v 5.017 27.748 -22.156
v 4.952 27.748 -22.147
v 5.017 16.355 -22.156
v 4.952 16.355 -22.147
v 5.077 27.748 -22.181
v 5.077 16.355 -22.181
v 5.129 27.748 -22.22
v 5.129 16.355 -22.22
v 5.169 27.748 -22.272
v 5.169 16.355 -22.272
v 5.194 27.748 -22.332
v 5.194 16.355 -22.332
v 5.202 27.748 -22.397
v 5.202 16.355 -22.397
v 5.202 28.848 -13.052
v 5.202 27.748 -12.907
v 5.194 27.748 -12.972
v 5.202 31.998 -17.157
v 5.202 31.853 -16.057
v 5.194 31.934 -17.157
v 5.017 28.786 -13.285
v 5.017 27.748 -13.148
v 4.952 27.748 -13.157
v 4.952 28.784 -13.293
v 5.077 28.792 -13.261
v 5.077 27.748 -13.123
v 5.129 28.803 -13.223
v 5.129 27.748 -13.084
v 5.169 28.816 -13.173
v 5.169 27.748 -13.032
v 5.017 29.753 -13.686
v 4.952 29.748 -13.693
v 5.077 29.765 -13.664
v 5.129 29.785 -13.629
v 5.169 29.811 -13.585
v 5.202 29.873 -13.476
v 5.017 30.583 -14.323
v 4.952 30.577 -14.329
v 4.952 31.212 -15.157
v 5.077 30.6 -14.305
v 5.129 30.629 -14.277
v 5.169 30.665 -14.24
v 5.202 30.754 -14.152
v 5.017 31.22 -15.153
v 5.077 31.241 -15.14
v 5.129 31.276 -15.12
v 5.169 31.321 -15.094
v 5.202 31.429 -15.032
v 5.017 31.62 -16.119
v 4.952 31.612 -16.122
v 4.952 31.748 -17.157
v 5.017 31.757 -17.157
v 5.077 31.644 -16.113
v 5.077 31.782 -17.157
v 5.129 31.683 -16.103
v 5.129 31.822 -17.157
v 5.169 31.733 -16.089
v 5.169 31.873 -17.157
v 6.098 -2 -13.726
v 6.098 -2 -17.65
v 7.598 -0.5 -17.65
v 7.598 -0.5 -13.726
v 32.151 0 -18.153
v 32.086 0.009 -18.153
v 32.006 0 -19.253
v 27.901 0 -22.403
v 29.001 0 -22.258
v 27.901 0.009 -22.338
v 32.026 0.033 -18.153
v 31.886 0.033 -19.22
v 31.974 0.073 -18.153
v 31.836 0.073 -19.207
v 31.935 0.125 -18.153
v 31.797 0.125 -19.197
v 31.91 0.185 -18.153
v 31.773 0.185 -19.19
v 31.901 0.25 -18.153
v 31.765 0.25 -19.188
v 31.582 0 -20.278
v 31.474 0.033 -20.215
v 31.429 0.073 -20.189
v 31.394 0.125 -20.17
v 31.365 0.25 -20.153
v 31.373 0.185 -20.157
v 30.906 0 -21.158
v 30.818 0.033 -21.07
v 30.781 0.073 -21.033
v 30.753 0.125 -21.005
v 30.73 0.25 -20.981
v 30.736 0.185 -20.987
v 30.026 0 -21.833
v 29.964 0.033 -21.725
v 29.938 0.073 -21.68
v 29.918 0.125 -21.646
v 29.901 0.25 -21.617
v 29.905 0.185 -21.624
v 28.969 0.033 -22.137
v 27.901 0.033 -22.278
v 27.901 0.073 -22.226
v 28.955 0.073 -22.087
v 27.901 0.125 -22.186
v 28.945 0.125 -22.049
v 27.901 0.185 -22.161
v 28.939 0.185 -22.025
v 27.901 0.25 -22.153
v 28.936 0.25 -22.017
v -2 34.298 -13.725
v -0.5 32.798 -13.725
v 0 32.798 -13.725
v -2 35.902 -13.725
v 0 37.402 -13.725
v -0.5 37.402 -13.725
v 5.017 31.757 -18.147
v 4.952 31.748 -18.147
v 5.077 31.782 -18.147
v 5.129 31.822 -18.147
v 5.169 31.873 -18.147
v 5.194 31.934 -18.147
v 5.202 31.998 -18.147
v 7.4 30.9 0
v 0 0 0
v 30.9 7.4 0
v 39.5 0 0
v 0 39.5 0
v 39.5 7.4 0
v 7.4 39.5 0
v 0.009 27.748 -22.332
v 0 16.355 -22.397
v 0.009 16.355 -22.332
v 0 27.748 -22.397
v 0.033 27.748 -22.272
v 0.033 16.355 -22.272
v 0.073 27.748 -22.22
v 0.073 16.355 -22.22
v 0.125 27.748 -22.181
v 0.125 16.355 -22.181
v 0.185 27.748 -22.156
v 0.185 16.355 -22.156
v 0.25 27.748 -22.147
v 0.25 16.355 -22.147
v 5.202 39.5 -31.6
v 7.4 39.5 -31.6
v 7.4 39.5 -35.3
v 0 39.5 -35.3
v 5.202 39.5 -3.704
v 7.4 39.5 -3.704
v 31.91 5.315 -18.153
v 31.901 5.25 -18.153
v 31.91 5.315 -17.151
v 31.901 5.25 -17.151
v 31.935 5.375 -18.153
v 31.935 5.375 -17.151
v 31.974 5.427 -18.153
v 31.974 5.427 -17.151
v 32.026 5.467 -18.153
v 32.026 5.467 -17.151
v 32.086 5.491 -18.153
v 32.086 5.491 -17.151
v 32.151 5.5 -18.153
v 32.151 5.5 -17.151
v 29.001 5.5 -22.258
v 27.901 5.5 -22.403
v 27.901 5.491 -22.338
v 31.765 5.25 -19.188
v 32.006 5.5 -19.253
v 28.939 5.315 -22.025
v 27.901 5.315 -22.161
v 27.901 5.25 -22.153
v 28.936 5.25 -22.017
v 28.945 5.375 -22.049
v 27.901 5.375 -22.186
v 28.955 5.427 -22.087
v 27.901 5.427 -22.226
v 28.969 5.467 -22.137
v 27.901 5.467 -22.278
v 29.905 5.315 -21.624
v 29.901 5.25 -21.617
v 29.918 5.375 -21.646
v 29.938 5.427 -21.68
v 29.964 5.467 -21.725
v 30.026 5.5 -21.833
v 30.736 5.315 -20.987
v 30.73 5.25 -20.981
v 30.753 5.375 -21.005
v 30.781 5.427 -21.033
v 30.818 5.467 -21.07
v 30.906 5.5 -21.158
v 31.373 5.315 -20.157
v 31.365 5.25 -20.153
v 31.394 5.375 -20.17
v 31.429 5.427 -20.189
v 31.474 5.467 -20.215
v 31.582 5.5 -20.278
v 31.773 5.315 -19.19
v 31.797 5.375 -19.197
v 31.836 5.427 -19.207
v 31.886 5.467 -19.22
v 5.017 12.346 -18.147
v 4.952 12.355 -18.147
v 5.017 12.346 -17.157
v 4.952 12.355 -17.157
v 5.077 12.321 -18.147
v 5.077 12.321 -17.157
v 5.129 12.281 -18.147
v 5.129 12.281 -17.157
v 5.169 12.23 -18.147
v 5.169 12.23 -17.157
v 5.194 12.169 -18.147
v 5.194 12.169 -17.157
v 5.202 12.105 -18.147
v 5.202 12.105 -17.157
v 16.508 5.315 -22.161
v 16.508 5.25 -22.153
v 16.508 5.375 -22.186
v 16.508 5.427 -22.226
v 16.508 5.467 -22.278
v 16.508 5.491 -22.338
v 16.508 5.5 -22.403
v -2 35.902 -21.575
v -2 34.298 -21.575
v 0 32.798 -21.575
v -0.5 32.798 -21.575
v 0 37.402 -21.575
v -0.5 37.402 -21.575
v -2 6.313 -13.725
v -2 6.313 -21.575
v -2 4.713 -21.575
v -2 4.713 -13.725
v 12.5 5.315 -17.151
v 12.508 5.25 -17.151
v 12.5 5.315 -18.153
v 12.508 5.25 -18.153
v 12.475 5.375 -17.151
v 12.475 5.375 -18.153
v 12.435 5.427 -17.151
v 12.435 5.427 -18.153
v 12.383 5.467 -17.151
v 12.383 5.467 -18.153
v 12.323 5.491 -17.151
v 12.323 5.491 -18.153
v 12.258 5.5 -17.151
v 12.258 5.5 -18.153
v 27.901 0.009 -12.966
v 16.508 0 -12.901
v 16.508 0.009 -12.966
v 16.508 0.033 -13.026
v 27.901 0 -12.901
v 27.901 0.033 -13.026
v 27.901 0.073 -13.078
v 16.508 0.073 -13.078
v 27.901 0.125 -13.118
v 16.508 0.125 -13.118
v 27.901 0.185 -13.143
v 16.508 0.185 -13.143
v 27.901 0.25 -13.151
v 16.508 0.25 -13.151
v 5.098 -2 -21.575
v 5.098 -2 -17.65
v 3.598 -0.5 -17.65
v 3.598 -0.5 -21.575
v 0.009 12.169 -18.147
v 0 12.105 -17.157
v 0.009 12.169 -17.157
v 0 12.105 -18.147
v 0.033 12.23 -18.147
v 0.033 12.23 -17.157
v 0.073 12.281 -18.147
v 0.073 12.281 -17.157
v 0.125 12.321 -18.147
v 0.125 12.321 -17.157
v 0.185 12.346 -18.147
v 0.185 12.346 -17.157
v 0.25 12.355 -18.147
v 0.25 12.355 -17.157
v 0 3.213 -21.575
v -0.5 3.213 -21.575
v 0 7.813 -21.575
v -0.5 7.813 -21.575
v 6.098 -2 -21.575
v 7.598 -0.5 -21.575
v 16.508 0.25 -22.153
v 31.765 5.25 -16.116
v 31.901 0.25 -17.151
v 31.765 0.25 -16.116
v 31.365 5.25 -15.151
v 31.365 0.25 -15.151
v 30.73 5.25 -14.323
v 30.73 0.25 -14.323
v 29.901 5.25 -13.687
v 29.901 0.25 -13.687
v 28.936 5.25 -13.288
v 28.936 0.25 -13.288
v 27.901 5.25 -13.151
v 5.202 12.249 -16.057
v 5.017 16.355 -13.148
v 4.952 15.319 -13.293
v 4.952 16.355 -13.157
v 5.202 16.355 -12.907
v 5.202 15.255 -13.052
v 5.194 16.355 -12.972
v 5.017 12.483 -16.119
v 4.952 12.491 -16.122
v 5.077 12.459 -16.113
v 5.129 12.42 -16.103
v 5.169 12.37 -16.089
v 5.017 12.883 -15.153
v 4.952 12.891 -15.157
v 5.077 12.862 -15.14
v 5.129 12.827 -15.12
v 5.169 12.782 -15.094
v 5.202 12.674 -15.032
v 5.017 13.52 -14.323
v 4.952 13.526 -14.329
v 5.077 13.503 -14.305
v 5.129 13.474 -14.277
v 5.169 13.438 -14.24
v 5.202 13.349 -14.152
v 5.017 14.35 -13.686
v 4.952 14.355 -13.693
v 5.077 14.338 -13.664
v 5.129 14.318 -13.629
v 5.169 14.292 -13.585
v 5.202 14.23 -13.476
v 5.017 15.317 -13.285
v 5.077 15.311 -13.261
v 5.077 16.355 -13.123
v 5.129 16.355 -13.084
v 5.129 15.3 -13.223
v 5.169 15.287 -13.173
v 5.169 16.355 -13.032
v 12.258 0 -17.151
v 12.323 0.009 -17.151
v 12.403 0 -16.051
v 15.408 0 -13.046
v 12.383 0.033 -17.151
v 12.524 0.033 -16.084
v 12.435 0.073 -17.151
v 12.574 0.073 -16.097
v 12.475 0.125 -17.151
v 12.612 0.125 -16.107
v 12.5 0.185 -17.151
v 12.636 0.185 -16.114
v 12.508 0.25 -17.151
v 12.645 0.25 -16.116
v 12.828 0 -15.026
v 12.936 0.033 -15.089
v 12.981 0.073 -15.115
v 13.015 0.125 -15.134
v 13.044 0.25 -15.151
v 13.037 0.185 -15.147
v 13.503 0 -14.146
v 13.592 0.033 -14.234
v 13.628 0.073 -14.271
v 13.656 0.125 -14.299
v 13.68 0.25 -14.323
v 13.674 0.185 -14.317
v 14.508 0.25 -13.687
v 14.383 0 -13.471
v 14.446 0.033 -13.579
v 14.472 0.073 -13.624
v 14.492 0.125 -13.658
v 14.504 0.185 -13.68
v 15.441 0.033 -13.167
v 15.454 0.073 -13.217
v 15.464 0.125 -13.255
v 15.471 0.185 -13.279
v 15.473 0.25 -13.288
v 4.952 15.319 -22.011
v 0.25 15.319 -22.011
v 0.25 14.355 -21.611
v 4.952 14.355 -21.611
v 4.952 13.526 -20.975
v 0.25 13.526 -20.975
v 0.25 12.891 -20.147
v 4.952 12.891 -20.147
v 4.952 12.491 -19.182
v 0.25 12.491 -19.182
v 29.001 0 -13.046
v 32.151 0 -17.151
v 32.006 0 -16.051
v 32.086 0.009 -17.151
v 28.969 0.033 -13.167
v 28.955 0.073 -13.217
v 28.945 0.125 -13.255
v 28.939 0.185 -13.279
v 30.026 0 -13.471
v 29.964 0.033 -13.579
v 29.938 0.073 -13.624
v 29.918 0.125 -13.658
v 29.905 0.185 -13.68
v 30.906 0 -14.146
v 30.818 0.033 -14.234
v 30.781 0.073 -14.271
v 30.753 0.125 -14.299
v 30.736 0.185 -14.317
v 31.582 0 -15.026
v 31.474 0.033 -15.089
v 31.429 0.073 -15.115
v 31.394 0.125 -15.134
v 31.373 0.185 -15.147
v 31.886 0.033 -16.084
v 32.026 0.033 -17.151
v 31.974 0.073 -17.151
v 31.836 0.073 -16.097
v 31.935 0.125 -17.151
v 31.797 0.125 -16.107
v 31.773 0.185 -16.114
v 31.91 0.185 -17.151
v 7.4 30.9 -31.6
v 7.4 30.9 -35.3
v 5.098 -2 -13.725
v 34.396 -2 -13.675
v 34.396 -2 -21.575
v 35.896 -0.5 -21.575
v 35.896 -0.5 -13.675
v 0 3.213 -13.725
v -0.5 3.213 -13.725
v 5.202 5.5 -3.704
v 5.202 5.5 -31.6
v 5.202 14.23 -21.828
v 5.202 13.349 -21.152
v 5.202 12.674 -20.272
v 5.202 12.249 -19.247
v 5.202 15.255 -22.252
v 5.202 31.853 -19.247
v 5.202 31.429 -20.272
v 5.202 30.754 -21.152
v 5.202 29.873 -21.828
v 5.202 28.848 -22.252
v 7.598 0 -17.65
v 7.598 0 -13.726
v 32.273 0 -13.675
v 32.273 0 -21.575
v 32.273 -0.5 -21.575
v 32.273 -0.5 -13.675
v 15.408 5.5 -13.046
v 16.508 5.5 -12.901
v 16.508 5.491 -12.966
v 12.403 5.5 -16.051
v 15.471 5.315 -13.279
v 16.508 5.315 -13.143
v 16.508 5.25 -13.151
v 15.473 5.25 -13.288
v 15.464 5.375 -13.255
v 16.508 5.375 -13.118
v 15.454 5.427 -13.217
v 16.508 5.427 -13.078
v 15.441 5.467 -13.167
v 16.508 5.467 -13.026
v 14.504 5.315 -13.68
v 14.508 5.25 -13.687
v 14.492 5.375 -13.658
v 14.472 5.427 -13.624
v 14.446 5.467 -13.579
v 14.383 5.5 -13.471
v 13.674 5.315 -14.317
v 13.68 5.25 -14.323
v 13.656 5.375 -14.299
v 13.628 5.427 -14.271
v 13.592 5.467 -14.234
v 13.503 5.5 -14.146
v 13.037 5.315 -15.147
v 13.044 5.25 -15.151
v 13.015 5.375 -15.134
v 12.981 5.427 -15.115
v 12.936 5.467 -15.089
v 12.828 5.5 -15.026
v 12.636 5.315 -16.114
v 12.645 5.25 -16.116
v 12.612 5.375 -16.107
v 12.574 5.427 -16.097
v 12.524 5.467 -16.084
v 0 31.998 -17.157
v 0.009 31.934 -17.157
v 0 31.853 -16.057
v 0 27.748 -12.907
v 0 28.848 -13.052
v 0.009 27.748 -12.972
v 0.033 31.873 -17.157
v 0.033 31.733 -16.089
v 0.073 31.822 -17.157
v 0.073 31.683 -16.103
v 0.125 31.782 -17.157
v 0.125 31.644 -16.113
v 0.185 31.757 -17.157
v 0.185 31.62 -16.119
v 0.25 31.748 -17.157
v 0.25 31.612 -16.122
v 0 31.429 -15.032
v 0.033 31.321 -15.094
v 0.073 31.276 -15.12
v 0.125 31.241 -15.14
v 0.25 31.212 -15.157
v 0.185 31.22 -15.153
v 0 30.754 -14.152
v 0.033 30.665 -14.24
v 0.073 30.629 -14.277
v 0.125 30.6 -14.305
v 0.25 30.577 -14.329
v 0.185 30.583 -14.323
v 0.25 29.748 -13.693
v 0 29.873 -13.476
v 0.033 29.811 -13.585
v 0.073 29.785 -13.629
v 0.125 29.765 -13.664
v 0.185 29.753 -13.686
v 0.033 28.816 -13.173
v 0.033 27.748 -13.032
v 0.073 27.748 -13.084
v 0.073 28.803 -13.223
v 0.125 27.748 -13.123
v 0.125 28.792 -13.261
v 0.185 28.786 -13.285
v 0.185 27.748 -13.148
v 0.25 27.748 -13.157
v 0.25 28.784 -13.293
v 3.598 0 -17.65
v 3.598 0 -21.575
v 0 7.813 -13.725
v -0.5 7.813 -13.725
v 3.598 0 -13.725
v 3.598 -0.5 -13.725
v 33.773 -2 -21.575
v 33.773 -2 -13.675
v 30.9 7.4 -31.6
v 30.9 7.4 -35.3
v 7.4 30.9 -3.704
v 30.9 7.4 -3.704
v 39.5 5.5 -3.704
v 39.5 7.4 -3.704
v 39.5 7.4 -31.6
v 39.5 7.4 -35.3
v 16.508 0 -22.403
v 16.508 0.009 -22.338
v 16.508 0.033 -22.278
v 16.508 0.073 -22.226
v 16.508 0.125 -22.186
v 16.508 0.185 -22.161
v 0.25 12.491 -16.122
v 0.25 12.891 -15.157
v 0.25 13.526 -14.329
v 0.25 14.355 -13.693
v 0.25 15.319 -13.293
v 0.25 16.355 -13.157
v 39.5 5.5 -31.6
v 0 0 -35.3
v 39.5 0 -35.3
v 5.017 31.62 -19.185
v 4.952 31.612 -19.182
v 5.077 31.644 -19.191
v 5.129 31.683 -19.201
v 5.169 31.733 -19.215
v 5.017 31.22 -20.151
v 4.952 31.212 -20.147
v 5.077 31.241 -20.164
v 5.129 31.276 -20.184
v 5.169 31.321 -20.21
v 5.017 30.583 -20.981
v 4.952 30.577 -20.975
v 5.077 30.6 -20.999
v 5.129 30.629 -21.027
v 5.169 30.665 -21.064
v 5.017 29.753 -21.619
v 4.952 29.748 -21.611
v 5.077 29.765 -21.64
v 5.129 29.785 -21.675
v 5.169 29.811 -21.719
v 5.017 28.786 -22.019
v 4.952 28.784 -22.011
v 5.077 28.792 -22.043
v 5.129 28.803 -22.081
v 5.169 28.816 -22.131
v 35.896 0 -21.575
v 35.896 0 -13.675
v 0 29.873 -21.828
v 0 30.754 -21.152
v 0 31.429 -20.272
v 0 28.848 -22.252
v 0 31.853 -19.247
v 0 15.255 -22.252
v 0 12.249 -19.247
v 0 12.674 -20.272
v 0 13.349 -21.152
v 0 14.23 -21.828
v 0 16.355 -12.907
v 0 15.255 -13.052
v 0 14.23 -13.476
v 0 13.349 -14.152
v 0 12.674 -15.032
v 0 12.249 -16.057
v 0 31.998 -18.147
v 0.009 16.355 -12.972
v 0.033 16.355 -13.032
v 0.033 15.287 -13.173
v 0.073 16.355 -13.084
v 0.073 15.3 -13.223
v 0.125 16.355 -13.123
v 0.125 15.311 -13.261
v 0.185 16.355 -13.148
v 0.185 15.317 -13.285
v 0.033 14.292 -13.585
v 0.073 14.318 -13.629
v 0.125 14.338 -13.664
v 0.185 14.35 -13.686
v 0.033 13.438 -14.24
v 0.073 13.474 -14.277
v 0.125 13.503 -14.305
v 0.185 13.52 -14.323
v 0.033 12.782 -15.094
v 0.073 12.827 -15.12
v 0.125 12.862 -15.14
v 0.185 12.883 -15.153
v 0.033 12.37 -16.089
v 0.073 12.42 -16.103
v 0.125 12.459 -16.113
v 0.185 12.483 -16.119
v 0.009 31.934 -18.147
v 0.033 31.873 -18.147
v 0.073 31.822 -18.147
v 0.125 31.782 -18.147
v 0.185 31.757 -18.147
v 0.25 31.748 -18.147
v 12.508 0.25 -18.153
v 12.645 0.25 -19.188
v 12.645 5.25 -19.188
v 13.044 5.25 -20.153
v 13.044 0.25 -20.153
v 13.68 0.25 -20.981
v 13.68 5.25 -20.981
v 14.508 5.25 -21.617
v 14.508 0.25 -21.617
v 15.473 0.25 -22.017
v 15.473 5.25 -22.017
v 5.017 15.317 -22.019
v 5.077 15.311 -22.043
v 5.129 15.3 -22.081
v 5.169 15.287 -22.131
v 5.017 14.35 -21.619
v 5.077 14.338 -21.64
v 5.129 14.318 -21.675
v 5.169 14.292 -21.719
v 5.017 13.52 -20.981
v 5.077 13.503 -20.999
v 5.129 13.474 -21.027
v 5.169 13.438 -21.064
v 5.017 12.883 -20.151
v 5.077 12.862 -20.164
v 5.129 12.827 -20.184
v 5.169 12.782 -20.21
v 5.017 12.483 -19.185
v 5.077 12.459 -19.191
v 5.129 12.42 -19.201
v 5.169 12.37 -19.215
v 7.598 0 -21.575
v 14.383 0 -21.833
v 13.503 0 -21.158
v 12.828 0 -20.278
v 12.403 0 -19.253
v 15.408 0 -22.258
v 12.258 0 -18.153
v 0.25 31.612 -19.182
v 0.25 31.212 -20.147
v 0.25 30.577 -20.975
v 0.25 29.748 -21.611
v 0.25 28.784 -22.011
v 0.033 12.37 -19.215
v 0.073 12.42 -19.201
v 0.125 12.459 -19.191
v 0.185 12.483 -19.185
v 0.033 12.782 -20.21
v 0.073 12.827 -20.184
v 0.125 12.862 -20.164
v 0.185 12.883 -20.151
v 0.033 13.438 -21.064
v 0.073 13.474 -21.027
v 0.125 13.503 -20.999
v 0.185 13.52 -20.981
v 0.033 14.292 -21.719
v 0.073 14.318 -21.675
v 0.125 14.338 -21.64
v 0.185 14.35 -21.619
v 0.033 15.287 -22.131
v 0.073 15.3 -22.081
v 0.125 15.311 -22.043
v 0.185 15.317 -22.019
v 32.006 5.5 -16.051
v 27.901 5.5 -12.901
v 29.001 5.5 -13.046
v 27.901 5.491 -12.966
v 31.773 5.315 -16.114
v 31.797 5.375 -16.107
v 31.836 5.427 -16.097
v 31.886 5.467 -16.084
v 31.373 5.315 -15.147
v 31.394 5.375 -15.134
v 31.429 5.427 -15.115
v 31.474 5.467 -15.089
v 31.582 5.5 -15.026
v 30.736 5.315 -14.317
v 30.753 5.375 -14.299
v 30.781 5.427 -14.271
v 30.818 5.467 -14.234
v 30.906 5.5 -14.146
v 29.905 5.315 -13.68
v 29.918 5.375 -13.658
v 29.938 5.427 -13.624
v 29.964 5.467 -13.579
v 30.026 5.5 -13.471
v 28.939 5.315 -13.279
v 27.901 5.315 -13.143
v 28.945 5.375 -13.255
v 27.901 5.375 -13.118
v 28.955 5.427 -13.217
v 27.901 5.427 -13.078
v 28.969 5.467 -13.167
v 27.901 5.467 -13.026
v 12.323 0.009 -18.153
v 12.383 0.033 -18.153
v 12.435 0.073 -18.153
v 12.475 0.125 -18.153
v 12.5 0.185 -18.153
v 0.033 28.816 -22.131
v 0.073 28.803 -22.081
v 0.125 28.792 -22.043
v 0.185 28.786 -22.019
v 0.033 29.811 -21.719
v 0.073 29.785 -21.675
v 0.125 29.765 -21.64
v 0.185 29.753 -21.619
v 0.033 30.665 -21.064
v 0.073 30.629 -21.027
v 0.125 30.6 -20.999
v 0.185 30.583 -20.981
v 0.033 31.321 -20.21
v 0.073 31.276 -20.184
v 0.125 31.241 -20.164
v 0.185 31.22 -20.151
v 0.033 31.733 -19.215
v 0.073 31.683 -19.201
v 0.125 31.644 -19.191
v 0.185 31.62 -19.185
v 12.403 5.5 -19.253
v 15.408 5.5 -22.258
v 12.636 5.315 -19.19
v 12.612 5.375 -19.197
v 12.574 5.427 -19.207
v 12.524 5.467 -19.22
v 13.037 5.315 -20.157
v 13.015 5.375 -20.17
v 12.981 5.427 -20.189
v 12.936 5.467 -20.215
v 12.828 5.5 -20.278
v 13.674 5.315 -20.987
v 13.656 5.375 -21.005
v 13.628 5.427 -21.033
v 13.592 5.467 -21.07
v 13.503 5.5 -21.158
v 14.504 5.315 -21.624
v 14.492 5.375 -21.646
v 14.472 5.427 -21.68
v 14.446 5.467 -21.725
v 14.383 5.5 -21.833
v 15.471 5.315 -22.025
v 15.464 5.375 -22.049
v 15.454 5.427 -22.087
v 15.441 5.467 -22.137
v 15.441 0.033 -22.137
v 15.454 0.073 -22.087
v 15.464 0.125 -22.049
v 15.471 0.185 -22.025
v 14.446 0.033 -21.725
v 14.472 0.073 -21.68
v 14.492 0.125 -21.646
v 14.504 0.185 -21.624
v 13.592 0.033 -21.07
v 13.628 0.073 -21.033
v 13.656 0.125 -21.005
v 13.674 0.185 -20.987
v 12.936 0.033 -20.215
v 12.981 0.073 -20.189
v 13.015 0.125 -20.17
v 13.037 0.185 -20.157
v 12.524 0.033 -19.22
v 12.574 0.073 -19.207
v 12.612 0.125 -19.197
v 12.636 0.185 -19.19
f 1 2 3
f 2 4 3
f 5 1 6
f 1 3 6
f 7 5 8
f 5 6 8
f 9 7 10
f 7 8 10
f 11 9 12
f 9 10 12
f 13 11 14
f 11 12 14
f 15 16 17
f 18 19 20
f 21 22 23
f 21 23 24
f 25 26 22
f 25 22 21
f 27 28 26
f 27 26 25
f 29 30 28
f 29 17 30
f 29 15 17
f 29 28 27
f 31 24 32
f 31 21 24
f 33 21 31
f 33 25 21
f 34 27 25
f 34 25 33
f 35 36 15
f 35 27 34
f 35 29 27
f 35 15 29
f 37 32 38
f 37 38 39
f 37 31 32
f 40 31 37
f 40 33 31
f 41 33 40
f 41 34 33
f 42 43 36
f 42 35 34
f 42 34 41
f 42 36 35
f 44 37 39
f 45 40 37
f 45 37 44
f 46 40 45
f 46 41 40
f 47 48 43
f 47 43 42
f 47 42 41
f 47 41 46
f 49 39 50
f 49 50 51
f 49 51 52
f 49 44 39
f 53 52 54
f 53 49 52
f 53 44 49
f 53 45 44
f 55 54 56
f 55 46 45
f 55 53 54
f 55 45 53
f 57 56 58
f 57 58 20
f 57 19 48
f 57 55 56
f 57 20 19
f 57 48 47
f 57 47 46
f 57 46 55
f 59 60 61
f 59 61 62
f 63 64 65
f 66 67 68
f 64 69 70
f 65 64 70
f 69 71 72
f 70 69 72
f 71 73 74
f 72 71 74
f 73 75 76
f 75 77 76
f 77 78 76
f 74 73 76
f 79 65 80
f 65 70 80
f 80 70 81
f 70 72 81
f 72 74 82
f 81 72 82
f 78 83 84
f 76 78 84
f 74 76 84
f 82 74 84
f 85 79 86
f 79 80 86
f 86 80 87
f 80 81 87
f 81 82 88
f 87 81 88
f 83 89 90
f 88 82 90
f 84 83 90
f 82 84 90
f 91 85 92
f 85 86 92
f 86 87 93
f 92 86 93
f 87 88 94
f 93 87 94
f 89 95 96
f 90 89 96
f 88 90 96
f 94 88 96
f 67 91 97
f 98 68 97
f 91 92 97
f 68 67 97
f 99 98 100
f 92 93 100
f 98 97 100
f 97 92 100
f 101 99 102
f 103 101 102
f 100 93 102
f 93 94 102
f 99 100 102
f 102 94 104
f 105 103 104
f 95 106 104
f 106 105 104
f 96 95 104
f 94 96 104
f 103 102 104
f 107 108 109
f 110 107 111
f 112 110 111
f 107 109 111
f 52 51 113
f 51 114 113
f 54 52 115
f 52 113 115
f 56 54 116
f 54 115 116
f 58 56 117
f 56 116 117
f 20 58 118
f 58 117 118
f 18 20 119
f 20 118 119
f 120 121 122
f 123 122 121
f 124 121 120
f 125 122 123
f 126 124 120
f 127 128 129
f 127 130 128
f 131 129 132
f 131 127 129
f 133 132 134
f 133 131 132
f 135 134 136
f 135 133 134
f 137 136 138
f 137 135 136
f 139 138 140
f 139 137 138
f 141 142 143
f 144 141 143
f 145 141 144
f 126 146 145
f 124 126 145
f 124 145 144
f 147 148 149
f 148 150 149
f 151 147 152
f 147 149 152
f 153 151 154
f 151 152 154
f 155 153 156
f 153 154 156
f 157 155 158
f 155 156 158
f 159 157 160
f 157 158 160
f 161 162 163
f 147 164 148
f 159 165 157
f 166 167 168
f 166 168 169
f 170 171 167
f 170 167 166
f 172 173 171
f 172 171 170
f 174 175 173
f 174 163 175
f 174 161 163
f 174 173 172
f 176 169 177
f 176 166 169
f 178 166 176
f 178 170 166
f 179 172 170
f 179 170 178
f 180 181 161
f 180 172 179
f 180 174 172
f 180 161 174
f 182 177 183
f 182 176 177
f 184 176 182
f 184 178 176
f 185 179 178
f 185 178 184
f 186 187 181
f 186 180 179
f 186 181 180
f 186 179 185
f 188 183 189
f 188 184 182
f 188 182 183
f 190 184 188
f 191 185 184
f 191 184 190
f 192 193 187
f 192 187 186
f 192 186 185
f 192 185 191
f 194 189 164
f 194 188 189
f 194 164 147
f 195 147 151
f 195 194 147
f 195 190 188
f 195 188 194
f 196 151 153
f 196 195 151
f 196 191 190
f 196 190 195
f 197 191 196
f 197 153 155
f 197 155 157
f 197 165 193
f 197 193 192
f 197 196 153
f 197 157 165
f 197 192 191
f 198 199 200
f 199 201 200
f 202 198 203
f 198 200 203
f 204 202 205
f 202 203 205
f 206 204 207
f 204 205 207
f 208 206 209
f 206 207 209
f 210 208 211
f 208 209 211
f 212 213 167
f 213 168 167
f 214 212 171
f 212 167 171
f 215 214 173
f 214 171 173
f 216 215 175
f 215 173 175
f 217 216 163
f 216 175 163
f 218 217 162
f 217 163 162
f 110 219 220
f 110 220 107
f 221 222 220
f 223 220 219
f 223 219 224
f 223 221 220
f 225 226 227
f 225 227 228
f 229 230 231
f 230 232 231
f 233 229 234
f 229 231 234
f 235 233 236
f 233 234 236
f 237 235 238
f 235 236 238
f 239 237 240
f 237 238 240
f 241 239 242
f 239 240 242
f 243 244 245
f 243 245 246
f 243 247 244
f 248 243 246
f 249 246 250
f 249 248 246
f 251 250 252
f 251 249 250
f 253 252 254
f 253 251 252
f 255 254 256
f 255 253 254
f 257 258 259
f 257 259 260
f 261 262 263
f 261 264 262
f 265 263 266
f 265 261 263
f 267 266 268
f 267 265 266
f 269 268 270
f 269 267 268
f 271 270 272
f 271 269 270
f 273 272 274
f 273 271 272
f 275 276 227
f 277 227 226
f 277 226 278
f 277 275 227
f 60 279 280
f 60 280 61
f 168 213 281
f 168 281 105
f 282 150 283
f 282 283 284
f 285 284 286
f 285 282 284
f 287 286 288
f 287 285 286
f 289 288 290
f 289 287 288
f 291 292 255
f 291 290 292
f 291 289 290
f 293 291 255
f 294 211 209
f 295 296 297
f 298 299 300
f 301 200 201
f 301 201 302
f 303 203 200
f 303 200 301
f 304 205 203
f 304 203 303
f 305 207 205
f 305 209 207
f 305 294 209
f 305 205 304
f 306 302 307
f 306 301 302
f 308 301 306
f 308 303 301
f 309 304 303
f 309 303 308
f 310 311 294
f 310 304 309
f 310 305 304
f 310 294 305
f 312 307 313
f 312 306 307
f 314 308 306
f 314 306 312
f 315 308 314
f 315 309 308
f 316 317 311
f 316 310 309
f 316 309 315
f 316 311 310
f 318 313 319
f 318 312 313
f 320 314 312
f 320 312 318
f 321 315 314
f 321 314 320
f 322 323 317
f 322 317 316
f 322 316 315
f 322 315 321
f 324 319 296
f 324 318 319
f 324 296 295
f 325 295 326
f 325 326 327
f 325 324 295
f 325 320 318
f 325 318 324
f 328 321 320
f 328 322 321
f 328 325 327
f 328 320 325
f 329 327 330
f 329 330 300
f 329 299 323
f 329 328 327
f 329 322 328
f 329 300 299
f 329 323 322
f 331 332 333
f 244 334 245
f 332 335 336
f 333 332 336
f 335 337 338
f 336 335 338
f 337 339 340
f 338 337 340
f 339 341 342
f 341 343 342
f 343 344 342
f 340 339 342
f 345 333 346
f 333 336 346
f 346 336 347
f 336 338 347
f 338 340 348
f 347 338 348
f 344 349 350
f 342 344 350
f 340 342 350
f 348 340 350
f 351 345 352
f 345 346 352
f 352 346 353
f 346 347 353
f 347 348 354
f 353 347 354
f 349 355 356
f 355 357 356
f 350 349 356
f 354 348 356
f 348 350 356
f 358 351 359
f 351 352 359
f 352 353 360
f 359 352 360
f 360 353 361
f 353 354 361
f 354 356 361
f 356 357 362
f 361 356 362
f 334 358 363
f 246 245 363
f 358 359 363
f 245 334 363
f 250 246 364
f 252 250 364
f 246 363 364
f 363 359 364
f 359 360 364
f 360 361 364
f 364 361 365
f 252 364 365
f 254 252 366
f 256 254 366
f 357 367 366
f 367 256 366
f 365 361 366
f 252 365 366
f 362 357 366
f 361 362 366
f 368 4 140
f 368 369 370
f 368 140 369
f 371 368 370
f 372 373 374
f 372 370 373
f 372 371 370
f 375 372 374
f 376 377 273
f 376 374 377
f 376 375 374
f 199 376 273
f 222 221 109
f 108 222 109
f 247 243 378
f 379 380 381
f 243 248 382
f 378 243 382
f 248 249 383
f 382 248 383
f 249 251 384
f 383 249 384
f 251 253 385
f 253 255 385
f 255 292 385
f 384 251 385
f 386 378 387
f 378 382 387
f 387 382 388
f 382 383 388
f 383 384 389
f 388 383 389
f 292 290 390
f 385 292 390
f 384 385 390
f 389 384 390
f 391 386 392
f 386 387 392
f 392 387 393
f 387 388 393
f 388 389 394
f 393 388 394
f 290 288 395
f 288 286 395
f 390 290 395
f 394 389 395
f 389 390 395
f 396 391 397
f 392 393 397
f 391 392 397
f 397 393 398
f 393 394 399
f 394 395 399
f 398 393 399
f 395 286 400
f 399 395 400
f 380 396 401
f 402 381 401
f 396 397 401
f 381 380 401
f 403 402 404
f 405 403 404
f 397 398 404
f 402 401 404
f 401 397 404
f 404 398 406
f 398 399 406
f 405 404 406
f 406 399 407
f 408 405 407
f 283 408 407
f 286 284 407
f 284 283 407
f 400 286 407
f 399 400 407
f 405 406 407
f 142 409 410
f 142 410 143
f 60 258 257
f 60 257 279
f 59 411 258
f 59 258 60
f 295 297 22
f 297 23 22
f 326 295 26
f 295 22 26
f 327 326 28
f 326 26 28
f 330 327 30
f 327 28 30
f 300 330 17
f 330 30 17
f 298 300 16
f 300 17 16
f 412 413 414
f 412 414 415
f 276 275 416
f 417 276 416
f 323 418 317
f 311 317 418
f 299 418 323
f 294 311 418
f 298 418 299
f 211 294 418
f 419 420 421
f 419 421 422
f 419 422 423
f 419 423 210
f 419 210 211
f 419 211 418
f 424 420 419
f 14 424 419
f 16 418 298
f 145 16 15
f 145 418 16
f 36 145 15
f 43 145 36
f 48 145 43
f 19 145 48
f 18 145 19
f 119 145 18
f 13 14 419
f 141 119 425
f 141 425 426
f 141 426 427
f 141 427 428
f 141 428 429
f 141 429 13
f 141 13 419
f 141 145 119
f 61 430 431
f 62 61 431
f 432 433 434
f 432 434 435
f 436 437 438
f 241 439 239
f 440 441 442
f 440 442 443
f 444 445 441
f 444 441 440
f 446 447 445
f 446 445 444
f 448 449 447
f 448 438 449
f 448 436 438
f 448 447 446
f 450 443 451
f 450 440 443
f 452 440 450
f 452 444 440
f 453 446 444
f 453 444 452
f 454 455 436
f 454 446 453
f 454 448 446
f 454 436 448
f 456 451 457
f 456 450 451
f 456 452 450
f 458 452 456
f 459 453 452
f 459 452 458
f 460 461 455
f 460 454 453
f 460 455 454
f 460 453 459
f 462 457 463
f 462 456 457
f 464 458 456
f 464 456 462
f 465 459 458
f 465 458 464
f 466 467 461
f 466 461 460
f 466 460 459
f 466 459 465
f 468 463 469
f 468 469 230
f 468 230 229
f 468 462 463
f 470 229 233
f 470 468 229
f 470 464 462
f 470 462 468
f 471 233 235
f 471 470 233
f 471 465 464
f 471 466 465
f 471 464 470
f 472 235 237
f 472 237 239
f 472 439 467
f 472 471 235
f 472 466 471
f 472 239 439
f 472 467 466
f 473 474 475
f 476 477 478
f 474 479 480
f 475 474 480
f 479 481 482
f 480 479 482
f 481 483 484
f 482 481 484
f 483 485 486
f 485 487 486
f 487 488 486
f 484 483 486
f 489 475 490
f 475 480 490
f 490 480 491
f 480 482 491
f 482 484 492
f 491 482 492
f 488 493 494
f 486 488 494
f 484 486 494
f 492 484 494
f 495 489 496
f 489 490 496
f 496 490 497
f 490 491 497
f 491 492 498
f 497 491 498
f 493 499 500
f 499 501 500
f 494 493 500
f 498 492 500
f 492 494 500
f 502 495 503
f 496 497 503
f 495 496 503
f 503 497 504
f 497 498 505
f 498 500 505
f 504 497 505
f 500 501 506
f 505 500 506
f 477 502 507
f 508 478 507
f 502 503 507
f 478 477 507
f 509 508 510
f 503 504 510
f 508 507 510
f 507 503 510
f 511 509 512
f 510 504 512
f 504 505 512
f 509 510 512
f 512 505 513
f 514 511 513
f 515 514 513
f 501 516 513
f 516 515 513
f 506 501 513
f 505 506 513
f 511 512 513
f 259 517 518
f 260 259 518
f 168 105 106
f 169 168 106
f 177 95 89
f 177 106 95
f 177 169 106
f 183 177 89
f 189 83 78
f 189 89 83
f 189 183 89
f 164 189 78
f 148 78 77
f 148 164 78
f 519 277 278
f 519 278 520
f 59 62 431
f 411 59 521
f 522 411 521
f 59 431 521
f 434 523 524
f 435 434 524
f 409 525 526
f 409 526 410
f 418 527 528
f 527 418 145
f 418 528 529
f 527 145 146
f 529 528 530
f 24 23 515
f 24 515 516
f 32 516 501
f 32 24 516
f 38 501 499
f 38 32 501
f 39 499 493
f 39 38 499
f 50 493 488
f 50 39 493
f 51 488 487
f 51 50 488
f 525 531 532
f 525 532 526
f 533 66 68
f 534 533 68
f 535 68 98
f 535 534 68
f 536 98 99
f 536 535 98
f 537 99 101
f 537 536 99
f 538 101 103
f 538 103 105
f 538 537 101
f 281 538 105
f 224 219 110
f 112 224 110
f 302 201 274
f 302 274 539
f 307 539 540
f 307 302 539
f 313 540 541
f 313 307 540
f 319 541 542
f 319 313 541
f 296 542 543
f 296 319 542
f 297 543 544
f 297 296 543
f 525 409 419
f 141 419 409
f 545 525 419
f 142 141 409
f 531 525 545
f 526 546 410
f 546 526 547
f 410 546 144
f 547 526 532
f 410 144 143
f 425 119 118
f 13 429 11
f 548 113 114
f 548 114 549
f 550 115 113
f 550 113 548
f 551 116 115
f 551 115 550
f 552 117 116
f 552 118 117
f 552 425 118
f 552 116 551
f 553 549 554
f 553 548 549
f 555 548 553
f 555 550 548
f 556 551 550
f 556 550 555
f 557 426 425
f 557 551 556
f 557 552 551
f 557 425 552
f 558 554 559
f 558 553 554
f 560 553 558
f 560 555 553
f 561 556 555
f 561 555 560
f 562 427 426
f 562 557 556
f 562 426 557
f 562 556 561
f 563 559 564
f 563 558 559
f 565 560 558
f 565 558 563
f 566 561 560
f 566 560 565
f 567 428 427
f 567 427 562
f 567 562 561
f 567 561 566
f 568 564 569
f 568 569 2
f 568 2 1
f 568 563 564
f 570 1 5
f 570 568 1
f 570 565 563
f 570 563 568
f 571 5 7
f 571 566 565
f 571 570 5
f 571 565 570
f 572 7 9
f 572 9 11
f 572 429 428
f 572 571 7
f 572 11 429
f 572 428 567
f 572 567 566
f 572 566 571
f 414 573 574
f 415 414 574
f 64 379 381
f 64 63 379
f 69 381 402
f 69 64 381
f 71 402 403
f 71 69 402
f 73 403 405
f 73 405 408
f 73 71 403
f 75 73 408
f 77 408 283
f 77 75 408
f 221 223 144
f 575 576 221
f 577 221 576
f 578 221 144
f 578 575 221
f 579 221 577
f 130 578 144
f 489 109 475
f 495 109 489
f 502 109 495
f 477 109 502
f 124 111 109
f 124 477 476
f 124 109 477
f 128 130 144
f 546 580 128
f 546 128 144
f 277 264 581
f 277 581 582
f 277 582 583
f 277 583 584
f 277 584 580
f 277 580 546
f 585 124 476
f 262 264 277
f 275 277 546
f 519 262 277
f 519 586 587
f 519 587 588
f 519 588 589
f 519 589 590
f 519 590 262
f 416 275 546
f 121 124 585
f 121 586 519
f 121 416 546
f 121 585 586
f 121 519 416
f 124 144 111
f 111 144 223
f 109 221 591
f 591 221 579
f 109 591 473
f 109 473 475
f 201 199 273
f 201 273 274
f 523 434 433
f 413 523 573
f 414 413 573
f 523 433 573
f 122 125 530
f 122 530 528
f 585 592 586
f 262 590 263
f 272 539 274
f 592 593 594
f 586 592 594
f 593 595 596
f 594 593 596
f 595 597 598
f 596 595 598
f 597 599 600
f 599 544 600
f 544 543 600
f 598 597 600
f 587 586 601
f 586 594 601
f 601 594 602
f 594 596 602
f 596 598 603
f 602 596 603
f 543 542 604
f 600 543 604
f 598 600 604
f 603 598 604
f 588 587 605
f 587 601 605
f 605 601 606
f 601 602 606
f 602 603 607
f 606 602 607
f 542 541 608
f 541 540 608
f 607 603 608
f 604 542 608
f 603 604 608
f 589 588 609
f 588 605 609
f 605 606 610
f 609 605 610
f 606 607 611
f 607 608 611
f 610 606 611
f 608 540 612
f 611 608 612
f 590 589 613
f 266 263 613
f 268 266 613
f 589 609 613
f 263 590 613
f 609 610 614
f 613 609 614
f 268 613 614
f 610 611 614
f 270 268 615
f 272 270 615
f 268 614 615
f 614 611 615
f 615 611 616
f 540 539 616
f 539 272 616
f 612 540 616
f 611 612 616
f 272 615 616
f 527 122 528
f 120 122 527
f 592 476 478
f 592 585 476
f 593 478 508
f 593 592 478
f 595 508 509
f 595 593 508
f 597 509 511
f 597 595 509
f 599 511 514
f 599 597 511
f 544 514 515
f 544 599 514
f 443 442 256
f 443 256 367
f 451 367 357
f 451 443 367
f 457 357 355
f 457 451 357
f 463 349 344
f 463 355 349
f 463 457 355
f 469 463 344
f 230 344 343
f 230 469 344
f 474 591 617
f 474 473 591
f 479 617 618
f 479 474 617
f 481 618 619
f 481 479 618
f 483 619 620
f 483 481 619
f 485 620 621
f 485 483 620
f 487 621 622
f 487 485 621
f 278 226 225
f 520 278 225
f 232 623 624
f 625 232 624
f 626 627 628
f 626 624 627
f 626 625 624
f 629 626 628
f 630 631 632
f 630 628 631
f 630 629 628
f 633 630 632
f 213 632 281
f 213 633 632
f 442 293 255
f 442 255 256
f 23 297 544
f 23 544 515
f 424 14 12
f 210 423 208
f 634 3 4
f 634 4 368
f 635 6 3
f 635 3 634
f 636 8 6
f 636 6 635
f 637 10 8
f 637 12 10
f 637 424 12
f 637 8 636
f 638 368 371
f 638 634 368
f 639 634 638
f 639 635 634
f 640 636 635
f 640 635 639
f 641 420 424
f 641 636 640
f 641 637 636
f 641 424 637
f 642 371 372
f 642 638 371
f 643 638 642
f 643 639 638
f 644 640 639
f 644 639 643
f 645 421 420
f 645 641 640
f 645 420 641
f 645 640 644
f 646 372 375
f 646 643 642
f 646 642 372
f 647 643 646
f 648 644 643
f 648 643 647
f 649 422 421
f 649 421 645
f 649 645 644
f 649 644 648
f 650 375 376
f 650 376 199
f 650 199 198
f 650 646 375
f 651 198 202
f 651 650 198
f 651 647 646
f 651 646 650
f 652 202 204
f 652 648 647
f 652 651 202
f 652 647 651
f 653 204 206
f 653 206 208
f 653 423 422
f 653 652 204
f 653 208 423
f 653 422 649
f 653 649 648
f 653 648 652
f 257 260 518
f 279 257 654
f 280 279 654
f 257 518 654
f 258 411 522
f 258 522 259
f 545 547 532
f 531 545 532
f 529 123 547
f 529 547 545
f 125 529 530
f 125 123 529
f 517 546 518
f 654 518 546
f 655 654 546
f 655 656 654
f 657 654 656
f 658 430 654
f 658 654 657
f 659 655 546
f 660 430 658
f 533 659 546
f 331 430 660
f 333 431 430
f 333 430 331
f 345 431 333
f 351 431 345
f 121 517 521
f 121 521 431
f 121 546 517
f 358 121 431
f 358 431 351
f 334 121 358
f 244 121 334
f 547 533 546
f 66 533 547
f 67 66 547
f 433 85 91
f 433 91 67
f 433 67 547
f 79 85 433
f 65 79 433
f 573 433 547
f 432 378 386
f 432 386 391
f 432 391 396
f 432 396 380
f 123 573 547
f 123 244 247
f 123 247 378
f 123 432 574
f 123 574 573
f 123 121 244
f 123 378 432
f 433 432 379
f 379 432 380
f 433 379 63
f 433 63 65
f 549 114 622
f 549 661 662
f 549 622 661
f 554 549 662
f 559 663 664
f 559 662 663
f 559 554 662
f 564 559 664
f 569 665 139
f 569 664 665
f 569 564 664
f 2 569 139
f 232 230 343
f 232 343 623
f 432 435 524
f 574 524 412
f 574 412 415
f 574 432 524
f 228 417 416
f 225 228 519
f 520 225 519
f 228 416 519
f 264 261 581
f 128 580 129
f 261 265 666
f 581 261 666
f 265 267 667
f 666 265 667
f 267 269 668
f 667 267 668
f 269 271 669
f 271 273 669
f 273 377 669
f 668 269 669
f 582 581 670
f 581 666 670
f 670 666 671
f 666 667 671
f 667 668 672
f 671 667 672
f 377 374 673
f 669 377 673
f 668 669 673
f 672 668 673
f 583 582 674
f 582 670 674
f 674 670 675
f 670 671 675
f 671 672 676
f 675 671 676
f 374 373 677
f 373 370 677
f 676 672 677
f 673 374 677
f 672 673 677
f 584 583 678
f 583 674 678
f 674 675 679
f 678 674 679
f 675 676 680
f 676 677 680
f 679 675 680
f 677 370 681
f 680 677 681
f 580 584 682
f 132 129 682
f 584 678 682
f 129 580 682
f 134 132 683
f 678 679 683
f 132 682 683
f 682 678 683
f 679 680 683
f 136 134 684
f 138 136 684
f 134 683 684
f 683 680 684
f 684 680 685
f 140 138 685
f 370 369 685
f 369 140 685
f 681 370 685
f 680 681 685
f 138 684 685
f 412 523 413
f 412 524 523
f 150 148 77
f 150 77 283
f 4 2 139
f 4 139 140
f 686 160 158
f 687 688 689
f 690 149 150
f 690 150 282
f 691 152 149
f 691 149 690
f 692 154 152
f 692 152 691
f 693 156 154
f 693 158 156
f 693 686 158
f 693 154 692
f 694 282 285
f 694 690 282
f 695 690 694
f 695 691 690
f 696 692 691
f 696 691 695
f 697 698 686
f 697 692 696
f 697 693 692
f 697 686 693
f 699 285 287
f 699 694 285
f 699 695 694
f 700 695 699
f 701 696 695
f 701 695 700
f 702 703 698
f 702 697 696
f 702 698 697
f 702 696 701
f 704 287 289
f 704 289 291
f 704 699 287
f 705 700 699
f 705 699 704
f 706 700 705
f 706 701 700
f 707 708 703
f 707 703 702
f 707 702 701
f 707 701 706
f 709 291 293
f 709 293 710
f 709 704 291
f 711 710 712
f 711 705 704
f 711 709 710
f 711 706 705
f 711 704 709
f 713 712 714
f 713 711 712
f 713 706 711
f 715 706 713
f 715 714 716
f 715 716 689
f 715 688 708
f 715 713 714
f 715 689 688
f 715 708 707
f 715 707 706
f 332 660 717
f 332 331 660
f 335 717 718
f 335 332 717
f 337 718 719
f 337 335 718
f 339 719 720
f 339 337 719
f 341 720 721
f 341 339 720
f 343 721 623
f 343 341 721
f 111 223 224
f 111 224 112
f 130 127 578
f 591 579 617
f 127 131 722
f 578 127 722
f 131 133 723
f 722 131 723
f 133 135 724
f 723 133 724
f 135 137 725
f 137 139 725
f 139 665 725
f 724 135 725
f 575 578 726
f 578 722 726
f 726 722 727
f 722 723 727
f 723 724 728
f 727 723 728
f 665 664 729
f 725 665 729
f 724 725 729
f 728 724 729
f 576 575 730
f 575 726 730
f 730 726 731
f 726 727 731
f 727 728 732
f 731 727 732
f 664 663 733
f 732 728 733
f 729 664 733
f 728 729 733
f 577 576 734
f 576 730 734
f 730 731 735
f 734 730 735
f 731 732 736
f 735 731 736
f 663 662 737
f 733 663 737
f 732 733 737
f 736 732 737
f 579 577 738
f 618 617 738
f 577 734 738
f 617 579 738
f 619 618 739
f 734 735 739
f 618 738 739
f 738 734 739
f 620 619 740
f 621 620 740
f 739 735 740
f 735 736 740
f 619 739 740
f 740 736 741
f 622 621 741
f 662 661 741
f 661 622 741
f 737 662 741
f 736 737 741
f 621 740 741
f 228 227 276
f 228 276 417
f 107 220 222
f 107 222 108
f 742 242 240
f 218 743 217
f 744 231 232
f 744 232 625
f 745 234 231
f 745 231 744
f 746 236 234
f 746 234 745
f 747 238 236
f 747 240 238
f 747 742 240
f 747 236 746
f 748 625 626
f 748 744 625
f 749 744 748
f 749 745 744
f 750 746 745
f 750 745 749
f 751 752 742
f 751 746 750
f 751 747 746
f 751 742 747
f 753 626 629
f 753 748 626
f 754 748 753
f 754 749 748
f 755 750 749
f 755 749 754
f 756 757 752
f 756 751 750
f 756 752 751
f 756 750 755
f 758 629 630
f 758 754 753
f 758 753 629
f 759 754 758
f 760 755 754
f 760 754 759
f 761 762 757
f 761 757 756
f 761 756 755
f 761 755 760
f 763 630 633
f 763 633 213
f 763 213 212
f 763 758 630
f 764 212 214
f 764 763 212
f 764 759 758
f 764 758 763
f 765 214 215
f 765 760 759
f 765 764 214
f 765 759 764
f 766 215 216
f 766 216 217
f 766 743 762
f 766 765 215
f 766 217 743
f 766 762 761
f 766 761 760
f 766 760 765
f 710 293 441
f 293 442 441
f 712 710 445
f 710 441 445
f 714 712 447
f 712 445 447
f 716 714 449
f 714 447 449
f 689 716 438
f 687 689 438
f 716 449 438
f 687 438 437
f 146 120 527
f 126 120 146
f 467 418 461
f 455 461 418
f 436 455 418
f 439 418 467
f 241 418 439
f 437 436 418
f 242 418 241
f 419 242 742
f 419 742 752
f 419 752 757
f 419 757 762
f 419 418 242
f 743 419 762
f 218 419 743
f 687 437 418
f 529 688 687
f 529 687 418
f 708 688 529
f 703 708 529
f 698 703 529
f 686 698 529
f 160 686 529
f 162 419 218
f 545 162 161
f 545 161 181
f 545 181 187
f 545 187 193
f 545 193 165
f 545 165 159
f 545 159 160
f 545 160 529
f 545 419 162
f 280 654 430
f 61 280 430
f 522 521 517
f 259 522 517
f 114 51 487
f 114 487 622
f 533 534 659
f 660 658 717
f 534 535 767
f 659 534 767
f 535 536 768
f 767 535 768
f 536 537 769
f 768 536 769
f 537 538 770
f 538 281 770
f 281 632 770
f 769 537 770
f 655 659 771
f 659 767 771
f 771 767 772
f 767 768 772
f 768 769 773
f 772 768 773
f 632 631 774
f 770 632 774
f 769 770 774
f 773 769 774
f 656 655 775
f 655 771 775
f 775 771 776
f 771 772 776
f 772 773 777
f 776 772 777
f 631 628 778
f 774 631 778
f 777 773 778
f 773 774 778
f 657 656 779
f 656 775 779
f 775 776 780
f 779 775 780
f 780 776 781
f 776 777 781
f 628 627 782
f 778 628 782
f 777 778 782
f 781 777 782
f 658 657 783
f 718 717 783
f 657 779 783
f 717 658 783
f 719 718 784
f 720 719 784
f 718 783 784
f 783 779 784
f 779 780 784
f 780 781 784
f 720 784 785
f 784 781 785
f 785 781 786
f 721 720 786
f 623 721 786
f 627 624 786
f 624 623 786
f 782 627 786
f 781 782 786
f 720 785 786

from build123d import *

# Parameters (mm, degrees)
BOSS_EXTRU_1_DEPTH      = 35.3
ESQUISSE2_W             = 34.2976806
ESQUISSE2_H             = 27.8959906
ENL_V_MAT_EXTRU_1_DEPTH = 34
ENL_V_MAT_EXTRU_5_DEPTH = 34
CONG_1_R                = 0.25
ENL_V_MAT_EXTRU_6_DEPTH = 34
CONG_2_R                = 0.25
BOSS_EXTRU_2_DEPTH      = 2
CHANFREIN1_SIZE         = 1.5
ESQUISSE6_W             = 3.622795385
ESQUISSE6_H             = 7.9
BOSS_EXTRU_4_DEPTH      = 2
CHANFREIN2_SIZE         = 1.5
ESQUISSE7_W             = 7.85
ESQUISSE7_H             = 4.6
ESQUISSE7_H_2           = 4.604428761
BOSS_EXTRU_5_DEPTH      = 2
CHANFREIN3_SIZE         = 1.5


with BuildPart() as part:
    # Esquisse1 → Boss.-Extru.1 (new body)
    with BuildSketch(Plane.XY):
        Polygon((0, 0), (39.5, 0), (39.5, 7.4), (30.9, 7.4), (7.4, 30.9), (7.4, 39.5), (0, 39.5), align=None)
    extrude(amount=-BOSS_EXTRU_1_DEPTH)

    # Esquisse2 → Enlèv. mat.-Extru.1 (cut)
    with BuildSketch(Plane(origin=(0, 39.5, 0), x_dir=(1, 0, 0), z_dir=(0, 1, 0))):
        with Locations((22.3511597, 17.6520047)):
            Rectangle(ESQUISSE2_W, ESQUISSE2_H)
    extrude(amount=-ENL_V_MAT_EXTRU_1_DEPTH, mode=Mode.SUBTRACT)

    # Esquisse3 → Enlèv. mat.-Extru.5 (cut)
    with BuildSketch(Plane(origin=(5.2023194, 0, 0), x_dir=(0, 0, -1), z_dir=(1, 0, 0))):
        with BuildLine():
            Line((18.147028677, 12.354666202), (17.156980723, 12.354666202))
            ThreePointArc((17.156980723, 12.354666202), (14.328553598, 13.526239077), (13.156980723, 16.354666202))
            Line((13.156980723, 16.354666202), (13.156980723, 27.748298541))
            ThreePointArc((13.156980723, 27.748298541), (14.328553598, 30.576725666), (17.156980723, 31.748298541))
            Line((17.156980723, 31.748298541), (18.147028677, 31.748298541))
            ThreePointArc((18.147028677, 31.748298541), (20.975455802, 30.576725666), (22.147028677, 27.748298541))
            Line((22.147028677, 27.748298541), (22.147028677, 16.354666202))
            ThreePointArc((22.147028677, 16.354666202), (20.975455802, 13.526239077), (18.147028677, 12.354666202))
        make_face()
    extrude(amount=-ENL_V_MAT_EXTRU_5_DEPTH, mode=Mode.SUBTRACT)

    # Congé1
    cong_1_edges = [part.edges().sort_by_distance(p)[0] for p in [
        (0, 13.526239077, -20.975455802),
        (0, 12.354666202, -17.6520047),
        (0, 13.526239077, -14.328553598),
        (0, 22.051482371, -13.156980723),
        (0, 30.576725666, -14.328553598),
        (0, 31.748298541, -17.6520047),
        (0, 30.576725666, -20.975455802),
        (0, 22.051482371, -22.147028677),
        (5.2023194, 13.526239077, -20.975455802),
        (5.2023194, 22.051482371, -22.147028677),
        (5.2023194, 30.576725666, -20.975455802),
        (5.2023194, 31.748298541, -17.6520047),
        (5.2023194, 30.576725666, -14.328553598),
        (5.2023194, 22.051482371, -13.156980723),
        (5.2023194, 13.526239077, -14.328553598),
        (5.2023194, 12.354666202, -17.6520047),
    ]]
    fillet(cong_1_edges, radius=CONG_1_R)

    # Esquisse4 → Enlèv. mat.-Extru.6 (cut)
    with BuildSketch(Plane(origin=(0, 5.5, 0), x_dir=(1, 0, 0), z_dir=(0, 1, 0))):
        with BuildLine():
            Line((12.508316826, 17.151207911), (12.508316826, 18.152801489))
            ThreePointArc((12.508316826, 18.152801489), (13.679889701, 20.981228614), (16.508316826, 22.152801489))
            Line((16.508316826, 22.152801489), (27.901153551, 22.152801489))
            ThreePointArc((27.901153551, 22.152801489), (30.729580676, 20.981228614), (31.901153551, 18.152801489))
            Line((31.901153551, 18.152801489), (31.901153551, 17.151207911))
            ThreePointArc((31.901153551, 17.151207911), (30.729580676, 14.322780786), (27.901153551, 13.151207911))
            Line((27.901153551, 13.151207911), (16.508316826, 13.151207911))
            ThreePointArc((16.508316826, 13.151207911), (13.679889701, 14.322780786), (12.508316826, 17.151207911))
        make_face()
    extrude(amount=-ENL_V_MAT_EXTRU_6_DEPTH, mode=Mode.SUBTRACT)

    # Congé2
    cong_2_edges = [part.edges().sort_by_distance(p)[0] for p in [
        (30.729580676, 0, -20.981228614),
        (31.901153551, 0, -17.6520047),
        (30.729580676, 0, -14.322780786),
        (22.204735188, 0, -13.151207911),
        (13.679889701, 0, -14.322780786),
        (12.508316826, 0, -17.6520047),
        (13.679889701, 0, -20.981228614),
        (22.204735188, 0, -22.152801489),
        (30.729580676, 5.5, -20.981228614),
        (22.204735188, 5.5, -22.152801489),
        (13.679889701, 5.5, -20.981228614),
        (12.508316826, 5.5, -17.6520047),
        (13.679889701, 5.5, -14.322780786),
        (22.204735188, 5.5, -13.151207911),
        (30.729580676, 5.5, -14.322780786),
        (31.901153551, 5.5, -17.6520047),
    ]]
    fillet(cong_2_edges, radius=CONG_2_R)

    # Esquisse5 → Boss.-Extru.2 (add)
    with BuildSketch(Plane.XZ):
        Polygon((3.598003918, -17.650224344), (3.598003918, -21.575224344), (7.598003918, -21.575224344), (7.598003918, -17.650473753), (7.598493353, -13.725723193), (3.598493384, -13.725224375), align=None)
    extrude(amount=BOSS_EXTRU_2_DEPTH)

    # Chanfrein1
    chanfrein1_edges = [part.edges().sort_by_distance(p)[0] for p in [
        (7.598248636, -2, -15.688098473),
        (3.598248651, -2, -15.687724359),
        (3.598003918, -2, -19.612724344),
        (7.598003918, -2, -19.612849049),
    ]]
    chamfer(chanfrein1_edges, length=CHANFREIN1_SIZE)

    # Esquisse6 → Boss.-Extru.4 (add)
    with BuildSketch(Plane.XZ):
        with Locations((34.084238676, -17.625224344)):
            Rectangle(ESQUISSE6_W, ESQUISSE6_H)
    extrude(amount=BOSS_EXTRU_4_DEPTH)

    # Chanfrein2
    chanfrein2_edges = [part.edges().sort_by_distance(p)[0] for p in [
        (35.895636368, -2, -17.625224344),
        (32.272840983, -2, -17.625224344),
    ]]
    chamfer(chanfrein2_edges, length=CHANFREIN2_SIZE)

    # Esquisse7 → Boss.-Extru.5 (add)
    with BuildSketch(Plane.ZY):
        with Locations((-17.650224344, 5.512563988)):
            Rectangle(ESQUISSE7_W, ESQUISSE7_H)
        with Locations((-17.650224344, 35.099755073)):
            Rectangle(ESQUISSE7_W, ESQUISSE7_H_2)
    extrude(amount=BOSS_EXTRU_5_DEPTH)

    # Chanfrein3
    chanfrein3_edges = [part.edges().sort_by_distance(p)[0] for p in [
        (-2, 7.812563988, -17.650224344),
        (-2, 3.212563988, -17.650224344),
        (-2, 37.401969453, -17.650224344),
        (-2, 32.797540692, -17.650224344),
    ]]
    chamfer(chanfrein3_edges, length=CHANFREIN3_SIZE)


solid = part.part
